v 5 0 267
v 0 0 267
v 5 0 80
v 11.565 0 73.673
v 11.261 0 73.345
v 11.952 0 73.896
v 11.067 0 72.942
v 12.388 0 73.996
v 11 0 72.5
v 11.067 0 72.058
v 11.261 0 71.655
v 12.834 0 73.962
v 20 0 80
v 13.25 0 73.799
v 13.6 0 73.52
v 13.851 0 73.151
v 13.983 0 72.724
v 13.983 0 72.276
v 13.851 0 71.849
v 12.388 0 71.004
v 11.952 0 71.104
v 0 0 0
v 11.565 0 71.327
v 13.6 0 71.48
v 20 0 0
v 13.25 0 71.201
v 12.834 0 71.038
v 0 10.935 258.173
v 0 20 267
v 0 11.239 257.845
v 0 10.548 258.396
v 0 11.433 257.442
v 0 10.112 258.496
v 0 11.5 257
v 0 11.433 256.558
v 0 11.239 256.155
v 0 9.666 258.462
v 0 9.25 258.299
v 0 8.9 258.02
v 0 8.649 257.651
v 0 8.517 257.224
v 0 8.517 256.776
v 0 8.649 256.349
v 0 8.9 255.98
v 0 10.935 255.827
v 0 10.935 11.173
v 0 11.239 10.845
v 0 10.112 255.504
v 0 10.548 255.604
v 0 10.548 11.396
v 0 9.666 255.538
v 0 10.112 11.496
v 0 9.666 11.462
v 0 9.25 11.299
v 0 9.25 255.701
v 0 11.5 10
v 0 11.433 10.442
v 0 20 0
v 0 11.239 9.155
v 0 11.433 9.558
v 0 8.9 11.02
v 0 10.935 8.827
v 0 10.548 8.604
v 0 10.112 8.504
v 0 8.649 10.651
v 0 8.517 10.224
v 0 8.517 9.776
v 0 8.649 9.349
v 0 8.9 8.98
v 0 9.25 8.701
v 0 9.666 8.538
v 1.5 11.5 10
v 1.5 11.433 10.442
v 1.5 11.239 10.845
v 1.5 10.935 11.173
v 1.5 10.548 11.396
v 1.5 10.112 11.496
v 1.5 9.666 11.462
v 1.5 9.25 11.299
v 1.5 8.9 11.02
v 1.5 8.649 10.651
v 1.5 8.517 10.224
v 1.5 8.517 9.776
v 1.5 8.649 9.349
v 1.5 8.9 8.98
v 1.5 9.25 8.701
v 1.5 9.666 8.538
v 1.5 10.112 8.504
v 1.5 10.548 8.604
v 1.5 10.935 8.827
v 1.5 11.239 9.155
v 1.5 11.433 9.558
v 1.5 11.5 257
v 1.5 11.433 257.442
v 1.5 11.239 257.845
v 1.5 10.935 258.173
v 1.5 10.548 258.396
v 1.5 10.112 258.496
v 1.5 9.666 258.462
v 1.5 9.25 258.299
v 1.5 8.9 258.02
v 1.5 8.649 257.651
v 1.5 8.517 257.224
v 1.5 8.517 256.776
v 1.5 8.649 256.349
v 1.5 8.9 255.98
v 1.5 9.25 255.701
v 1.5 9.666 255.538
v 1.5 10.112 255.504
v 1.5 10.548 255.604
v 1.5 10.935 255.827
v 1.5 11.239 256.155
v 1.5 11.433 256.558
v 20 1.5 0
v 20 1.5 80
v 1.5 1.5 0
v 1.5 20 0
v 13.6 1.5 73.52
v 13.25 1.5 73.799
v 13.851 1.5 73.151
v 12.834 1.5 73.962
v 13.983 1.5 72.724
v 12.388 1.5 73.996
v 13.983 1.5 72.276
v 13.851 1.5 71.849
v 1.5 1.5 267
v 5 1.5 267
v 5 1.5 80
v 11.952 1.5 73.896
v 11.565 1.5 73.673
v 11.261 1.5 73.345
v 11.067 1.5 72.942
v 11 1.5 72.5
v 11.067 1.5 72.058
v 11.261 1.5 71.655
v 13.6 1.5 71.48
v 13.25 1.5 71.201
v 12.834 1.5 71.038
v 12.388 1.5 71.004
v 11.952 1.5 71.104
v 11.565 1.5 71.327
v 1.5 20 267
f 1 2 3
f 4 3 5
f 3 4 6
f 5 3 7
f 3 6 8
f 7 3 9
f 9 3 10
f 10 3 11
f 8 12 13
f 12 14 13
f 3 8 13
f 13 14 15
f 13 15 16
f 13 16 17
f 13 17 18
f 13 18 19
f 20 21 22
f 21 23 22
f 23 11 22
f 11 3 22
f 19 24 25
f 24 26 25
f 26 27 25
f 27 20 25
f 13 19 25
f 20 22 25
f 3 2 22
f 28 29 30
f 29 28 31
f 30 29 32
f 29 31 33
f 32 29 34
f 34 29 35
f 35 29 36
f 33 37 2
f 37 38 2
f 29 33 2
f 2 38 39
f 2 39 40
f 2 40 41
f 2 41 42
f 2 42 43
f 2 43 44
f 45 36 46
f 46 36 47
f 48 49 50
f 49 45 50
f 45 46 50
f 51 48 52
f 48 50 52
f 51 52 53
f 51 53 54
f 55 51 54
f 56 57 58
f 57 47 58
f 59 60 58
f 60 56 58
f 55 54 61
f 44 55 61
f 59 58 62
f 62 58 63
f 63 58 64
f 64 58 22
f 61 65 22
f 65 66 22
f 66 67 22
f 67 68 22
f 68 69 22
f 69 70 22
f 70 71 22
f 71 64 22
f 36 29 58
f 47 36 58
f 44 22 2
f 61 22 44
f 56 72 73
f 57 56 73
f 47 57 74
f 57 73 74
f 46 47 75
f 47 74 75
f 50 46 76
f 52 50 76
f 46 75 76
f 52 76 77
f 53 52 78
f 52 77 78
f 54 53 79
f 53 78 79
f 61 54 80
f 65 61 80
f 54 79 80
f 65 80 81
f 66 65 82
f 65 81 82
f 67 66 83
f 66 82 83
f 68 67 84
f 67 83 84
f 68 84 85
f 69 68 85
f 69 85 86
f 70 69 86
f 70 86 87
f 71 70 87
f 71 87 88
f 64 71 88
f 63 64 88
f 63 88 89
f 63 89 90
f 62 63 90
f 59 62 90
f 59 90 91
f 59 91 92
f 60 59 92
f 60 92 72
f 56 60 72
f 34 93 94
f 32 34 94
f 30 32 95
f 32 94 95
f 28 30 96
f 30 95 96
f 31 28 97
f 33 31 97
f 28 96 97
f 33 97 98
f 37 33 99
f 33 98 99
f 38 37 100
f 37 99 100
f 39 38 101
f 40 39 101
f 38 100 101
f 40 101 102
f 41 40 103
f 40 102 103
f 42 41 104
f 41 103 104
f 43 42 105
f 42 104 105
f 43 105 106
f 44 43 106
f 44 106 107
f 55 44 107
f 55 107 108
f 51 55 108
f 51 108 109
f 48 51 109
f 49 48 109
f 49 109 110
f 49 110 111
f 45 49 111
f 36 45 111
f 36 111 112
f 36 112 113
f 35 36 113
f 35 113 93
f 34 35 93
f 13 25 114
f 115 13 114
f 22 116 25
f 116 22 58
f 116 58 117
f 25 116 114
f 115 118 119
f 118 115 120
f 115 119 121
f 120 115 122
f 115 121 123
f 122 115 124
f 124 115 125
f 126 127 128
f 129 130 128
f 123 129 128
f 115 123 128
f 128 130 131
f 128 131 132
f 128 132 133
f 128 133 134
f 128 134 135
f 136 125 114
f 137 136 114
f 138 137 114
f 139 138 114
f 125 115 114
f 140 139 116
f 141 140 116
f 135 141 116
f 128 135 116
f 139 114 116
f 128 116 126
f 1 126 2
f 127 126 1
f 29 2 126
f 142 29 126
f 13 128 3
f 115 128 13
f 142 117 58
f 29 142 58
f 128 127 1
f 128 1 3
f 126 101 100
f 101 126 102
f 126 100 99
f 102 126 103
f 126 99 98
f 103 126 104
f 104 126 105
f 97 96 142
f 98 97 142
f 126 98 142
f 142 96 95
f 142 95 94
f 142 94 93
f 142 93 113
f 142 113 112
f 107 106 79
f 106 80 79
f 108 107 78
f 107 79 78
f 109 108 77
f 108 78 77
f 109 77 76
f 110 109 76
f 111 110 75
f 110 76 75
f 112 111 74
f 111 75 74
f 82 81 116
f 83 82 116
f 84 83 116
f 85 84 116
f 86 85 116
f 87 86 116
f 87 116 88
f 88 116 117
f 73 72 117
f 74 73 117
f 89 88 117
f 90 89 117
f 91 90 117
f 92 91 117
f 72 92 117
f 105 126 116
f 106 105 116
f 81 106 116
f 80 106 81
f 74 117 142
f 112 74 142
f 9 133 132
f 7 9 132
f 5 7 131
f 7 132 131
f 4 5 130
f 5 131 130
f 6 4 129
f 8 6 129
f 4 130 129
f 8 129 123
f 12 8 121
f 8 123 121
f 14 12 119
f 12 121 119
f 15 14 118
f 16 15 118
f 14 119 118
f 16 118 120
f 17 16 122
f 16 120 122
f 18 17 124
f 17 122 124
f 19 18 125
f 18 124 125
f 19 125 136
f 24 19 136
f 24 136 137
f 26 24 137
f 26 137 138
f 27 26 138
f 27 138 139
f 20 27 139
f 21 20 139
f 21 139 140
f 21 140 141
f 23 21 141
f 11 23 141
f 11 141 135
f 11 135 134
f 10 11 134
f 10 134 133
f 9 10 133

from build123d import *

# Parameters (mm, degrees)
EXTRUSION1_DEPTH = 267
ESQUISSE2_R      = 1.5
ESQUISSE2_W      = 15
ESQUISSE2_H      = 187
EXTRUSION2_DEPTH = 269.38638192
ESQUISSE3_R      = 1.5
EXTRUSION3_DEPTH = 264


with BuildPart() as part:
    # Esquisse1 → Extrusion1 (new body)
    with BuildSketch(Plane.XY):
        Polygon((0, 0), (20, 0), (20, 1.5), (1.5, 1.5), (1.5, 20), (0, 20), align=None)
    extrude(amount=EXTRUSION1_DEPTH)

    # Esquisse2 → Extrusion2 (cut, through all)
    with BuildSketch(Plane(origin=(0, 1.5, 0), x_dir=(1, 0, 0), z_dir=(0, 1, 0))):
        with Locations(Location((12.5, -72.5, 0), (0, 0, 180))):
            Circle(ESQUISSE2_R)
        with Locations((12.5, -173.5)):
            Rectangle(ESQUISSE2_W, ESQUISSE2_H)
    extrude(amount=-EXTRUSION2_DEPTH, mode=Mode.SUBTRACT)

    # Esquisse3 → Extrusion3 (cut)
    with BuildSketch(Plane(origin=(1.5, 0, 0), x_dir=(0, 0, -1), z_dir=(1, 0, 0))):
        with Locations(Location((-257, 10, 0), (0, 0, 90))):
            Circle(ESQUISSE3_R)
        with Locations(Location((-10, 10, 0), (0, 0, 90))):
            Circle(ESQUISSE3_R)
    extrude(amount=-EXTRUSION3_DEPTH, mode=Mode.SUBTRACT)


solid = part.part
